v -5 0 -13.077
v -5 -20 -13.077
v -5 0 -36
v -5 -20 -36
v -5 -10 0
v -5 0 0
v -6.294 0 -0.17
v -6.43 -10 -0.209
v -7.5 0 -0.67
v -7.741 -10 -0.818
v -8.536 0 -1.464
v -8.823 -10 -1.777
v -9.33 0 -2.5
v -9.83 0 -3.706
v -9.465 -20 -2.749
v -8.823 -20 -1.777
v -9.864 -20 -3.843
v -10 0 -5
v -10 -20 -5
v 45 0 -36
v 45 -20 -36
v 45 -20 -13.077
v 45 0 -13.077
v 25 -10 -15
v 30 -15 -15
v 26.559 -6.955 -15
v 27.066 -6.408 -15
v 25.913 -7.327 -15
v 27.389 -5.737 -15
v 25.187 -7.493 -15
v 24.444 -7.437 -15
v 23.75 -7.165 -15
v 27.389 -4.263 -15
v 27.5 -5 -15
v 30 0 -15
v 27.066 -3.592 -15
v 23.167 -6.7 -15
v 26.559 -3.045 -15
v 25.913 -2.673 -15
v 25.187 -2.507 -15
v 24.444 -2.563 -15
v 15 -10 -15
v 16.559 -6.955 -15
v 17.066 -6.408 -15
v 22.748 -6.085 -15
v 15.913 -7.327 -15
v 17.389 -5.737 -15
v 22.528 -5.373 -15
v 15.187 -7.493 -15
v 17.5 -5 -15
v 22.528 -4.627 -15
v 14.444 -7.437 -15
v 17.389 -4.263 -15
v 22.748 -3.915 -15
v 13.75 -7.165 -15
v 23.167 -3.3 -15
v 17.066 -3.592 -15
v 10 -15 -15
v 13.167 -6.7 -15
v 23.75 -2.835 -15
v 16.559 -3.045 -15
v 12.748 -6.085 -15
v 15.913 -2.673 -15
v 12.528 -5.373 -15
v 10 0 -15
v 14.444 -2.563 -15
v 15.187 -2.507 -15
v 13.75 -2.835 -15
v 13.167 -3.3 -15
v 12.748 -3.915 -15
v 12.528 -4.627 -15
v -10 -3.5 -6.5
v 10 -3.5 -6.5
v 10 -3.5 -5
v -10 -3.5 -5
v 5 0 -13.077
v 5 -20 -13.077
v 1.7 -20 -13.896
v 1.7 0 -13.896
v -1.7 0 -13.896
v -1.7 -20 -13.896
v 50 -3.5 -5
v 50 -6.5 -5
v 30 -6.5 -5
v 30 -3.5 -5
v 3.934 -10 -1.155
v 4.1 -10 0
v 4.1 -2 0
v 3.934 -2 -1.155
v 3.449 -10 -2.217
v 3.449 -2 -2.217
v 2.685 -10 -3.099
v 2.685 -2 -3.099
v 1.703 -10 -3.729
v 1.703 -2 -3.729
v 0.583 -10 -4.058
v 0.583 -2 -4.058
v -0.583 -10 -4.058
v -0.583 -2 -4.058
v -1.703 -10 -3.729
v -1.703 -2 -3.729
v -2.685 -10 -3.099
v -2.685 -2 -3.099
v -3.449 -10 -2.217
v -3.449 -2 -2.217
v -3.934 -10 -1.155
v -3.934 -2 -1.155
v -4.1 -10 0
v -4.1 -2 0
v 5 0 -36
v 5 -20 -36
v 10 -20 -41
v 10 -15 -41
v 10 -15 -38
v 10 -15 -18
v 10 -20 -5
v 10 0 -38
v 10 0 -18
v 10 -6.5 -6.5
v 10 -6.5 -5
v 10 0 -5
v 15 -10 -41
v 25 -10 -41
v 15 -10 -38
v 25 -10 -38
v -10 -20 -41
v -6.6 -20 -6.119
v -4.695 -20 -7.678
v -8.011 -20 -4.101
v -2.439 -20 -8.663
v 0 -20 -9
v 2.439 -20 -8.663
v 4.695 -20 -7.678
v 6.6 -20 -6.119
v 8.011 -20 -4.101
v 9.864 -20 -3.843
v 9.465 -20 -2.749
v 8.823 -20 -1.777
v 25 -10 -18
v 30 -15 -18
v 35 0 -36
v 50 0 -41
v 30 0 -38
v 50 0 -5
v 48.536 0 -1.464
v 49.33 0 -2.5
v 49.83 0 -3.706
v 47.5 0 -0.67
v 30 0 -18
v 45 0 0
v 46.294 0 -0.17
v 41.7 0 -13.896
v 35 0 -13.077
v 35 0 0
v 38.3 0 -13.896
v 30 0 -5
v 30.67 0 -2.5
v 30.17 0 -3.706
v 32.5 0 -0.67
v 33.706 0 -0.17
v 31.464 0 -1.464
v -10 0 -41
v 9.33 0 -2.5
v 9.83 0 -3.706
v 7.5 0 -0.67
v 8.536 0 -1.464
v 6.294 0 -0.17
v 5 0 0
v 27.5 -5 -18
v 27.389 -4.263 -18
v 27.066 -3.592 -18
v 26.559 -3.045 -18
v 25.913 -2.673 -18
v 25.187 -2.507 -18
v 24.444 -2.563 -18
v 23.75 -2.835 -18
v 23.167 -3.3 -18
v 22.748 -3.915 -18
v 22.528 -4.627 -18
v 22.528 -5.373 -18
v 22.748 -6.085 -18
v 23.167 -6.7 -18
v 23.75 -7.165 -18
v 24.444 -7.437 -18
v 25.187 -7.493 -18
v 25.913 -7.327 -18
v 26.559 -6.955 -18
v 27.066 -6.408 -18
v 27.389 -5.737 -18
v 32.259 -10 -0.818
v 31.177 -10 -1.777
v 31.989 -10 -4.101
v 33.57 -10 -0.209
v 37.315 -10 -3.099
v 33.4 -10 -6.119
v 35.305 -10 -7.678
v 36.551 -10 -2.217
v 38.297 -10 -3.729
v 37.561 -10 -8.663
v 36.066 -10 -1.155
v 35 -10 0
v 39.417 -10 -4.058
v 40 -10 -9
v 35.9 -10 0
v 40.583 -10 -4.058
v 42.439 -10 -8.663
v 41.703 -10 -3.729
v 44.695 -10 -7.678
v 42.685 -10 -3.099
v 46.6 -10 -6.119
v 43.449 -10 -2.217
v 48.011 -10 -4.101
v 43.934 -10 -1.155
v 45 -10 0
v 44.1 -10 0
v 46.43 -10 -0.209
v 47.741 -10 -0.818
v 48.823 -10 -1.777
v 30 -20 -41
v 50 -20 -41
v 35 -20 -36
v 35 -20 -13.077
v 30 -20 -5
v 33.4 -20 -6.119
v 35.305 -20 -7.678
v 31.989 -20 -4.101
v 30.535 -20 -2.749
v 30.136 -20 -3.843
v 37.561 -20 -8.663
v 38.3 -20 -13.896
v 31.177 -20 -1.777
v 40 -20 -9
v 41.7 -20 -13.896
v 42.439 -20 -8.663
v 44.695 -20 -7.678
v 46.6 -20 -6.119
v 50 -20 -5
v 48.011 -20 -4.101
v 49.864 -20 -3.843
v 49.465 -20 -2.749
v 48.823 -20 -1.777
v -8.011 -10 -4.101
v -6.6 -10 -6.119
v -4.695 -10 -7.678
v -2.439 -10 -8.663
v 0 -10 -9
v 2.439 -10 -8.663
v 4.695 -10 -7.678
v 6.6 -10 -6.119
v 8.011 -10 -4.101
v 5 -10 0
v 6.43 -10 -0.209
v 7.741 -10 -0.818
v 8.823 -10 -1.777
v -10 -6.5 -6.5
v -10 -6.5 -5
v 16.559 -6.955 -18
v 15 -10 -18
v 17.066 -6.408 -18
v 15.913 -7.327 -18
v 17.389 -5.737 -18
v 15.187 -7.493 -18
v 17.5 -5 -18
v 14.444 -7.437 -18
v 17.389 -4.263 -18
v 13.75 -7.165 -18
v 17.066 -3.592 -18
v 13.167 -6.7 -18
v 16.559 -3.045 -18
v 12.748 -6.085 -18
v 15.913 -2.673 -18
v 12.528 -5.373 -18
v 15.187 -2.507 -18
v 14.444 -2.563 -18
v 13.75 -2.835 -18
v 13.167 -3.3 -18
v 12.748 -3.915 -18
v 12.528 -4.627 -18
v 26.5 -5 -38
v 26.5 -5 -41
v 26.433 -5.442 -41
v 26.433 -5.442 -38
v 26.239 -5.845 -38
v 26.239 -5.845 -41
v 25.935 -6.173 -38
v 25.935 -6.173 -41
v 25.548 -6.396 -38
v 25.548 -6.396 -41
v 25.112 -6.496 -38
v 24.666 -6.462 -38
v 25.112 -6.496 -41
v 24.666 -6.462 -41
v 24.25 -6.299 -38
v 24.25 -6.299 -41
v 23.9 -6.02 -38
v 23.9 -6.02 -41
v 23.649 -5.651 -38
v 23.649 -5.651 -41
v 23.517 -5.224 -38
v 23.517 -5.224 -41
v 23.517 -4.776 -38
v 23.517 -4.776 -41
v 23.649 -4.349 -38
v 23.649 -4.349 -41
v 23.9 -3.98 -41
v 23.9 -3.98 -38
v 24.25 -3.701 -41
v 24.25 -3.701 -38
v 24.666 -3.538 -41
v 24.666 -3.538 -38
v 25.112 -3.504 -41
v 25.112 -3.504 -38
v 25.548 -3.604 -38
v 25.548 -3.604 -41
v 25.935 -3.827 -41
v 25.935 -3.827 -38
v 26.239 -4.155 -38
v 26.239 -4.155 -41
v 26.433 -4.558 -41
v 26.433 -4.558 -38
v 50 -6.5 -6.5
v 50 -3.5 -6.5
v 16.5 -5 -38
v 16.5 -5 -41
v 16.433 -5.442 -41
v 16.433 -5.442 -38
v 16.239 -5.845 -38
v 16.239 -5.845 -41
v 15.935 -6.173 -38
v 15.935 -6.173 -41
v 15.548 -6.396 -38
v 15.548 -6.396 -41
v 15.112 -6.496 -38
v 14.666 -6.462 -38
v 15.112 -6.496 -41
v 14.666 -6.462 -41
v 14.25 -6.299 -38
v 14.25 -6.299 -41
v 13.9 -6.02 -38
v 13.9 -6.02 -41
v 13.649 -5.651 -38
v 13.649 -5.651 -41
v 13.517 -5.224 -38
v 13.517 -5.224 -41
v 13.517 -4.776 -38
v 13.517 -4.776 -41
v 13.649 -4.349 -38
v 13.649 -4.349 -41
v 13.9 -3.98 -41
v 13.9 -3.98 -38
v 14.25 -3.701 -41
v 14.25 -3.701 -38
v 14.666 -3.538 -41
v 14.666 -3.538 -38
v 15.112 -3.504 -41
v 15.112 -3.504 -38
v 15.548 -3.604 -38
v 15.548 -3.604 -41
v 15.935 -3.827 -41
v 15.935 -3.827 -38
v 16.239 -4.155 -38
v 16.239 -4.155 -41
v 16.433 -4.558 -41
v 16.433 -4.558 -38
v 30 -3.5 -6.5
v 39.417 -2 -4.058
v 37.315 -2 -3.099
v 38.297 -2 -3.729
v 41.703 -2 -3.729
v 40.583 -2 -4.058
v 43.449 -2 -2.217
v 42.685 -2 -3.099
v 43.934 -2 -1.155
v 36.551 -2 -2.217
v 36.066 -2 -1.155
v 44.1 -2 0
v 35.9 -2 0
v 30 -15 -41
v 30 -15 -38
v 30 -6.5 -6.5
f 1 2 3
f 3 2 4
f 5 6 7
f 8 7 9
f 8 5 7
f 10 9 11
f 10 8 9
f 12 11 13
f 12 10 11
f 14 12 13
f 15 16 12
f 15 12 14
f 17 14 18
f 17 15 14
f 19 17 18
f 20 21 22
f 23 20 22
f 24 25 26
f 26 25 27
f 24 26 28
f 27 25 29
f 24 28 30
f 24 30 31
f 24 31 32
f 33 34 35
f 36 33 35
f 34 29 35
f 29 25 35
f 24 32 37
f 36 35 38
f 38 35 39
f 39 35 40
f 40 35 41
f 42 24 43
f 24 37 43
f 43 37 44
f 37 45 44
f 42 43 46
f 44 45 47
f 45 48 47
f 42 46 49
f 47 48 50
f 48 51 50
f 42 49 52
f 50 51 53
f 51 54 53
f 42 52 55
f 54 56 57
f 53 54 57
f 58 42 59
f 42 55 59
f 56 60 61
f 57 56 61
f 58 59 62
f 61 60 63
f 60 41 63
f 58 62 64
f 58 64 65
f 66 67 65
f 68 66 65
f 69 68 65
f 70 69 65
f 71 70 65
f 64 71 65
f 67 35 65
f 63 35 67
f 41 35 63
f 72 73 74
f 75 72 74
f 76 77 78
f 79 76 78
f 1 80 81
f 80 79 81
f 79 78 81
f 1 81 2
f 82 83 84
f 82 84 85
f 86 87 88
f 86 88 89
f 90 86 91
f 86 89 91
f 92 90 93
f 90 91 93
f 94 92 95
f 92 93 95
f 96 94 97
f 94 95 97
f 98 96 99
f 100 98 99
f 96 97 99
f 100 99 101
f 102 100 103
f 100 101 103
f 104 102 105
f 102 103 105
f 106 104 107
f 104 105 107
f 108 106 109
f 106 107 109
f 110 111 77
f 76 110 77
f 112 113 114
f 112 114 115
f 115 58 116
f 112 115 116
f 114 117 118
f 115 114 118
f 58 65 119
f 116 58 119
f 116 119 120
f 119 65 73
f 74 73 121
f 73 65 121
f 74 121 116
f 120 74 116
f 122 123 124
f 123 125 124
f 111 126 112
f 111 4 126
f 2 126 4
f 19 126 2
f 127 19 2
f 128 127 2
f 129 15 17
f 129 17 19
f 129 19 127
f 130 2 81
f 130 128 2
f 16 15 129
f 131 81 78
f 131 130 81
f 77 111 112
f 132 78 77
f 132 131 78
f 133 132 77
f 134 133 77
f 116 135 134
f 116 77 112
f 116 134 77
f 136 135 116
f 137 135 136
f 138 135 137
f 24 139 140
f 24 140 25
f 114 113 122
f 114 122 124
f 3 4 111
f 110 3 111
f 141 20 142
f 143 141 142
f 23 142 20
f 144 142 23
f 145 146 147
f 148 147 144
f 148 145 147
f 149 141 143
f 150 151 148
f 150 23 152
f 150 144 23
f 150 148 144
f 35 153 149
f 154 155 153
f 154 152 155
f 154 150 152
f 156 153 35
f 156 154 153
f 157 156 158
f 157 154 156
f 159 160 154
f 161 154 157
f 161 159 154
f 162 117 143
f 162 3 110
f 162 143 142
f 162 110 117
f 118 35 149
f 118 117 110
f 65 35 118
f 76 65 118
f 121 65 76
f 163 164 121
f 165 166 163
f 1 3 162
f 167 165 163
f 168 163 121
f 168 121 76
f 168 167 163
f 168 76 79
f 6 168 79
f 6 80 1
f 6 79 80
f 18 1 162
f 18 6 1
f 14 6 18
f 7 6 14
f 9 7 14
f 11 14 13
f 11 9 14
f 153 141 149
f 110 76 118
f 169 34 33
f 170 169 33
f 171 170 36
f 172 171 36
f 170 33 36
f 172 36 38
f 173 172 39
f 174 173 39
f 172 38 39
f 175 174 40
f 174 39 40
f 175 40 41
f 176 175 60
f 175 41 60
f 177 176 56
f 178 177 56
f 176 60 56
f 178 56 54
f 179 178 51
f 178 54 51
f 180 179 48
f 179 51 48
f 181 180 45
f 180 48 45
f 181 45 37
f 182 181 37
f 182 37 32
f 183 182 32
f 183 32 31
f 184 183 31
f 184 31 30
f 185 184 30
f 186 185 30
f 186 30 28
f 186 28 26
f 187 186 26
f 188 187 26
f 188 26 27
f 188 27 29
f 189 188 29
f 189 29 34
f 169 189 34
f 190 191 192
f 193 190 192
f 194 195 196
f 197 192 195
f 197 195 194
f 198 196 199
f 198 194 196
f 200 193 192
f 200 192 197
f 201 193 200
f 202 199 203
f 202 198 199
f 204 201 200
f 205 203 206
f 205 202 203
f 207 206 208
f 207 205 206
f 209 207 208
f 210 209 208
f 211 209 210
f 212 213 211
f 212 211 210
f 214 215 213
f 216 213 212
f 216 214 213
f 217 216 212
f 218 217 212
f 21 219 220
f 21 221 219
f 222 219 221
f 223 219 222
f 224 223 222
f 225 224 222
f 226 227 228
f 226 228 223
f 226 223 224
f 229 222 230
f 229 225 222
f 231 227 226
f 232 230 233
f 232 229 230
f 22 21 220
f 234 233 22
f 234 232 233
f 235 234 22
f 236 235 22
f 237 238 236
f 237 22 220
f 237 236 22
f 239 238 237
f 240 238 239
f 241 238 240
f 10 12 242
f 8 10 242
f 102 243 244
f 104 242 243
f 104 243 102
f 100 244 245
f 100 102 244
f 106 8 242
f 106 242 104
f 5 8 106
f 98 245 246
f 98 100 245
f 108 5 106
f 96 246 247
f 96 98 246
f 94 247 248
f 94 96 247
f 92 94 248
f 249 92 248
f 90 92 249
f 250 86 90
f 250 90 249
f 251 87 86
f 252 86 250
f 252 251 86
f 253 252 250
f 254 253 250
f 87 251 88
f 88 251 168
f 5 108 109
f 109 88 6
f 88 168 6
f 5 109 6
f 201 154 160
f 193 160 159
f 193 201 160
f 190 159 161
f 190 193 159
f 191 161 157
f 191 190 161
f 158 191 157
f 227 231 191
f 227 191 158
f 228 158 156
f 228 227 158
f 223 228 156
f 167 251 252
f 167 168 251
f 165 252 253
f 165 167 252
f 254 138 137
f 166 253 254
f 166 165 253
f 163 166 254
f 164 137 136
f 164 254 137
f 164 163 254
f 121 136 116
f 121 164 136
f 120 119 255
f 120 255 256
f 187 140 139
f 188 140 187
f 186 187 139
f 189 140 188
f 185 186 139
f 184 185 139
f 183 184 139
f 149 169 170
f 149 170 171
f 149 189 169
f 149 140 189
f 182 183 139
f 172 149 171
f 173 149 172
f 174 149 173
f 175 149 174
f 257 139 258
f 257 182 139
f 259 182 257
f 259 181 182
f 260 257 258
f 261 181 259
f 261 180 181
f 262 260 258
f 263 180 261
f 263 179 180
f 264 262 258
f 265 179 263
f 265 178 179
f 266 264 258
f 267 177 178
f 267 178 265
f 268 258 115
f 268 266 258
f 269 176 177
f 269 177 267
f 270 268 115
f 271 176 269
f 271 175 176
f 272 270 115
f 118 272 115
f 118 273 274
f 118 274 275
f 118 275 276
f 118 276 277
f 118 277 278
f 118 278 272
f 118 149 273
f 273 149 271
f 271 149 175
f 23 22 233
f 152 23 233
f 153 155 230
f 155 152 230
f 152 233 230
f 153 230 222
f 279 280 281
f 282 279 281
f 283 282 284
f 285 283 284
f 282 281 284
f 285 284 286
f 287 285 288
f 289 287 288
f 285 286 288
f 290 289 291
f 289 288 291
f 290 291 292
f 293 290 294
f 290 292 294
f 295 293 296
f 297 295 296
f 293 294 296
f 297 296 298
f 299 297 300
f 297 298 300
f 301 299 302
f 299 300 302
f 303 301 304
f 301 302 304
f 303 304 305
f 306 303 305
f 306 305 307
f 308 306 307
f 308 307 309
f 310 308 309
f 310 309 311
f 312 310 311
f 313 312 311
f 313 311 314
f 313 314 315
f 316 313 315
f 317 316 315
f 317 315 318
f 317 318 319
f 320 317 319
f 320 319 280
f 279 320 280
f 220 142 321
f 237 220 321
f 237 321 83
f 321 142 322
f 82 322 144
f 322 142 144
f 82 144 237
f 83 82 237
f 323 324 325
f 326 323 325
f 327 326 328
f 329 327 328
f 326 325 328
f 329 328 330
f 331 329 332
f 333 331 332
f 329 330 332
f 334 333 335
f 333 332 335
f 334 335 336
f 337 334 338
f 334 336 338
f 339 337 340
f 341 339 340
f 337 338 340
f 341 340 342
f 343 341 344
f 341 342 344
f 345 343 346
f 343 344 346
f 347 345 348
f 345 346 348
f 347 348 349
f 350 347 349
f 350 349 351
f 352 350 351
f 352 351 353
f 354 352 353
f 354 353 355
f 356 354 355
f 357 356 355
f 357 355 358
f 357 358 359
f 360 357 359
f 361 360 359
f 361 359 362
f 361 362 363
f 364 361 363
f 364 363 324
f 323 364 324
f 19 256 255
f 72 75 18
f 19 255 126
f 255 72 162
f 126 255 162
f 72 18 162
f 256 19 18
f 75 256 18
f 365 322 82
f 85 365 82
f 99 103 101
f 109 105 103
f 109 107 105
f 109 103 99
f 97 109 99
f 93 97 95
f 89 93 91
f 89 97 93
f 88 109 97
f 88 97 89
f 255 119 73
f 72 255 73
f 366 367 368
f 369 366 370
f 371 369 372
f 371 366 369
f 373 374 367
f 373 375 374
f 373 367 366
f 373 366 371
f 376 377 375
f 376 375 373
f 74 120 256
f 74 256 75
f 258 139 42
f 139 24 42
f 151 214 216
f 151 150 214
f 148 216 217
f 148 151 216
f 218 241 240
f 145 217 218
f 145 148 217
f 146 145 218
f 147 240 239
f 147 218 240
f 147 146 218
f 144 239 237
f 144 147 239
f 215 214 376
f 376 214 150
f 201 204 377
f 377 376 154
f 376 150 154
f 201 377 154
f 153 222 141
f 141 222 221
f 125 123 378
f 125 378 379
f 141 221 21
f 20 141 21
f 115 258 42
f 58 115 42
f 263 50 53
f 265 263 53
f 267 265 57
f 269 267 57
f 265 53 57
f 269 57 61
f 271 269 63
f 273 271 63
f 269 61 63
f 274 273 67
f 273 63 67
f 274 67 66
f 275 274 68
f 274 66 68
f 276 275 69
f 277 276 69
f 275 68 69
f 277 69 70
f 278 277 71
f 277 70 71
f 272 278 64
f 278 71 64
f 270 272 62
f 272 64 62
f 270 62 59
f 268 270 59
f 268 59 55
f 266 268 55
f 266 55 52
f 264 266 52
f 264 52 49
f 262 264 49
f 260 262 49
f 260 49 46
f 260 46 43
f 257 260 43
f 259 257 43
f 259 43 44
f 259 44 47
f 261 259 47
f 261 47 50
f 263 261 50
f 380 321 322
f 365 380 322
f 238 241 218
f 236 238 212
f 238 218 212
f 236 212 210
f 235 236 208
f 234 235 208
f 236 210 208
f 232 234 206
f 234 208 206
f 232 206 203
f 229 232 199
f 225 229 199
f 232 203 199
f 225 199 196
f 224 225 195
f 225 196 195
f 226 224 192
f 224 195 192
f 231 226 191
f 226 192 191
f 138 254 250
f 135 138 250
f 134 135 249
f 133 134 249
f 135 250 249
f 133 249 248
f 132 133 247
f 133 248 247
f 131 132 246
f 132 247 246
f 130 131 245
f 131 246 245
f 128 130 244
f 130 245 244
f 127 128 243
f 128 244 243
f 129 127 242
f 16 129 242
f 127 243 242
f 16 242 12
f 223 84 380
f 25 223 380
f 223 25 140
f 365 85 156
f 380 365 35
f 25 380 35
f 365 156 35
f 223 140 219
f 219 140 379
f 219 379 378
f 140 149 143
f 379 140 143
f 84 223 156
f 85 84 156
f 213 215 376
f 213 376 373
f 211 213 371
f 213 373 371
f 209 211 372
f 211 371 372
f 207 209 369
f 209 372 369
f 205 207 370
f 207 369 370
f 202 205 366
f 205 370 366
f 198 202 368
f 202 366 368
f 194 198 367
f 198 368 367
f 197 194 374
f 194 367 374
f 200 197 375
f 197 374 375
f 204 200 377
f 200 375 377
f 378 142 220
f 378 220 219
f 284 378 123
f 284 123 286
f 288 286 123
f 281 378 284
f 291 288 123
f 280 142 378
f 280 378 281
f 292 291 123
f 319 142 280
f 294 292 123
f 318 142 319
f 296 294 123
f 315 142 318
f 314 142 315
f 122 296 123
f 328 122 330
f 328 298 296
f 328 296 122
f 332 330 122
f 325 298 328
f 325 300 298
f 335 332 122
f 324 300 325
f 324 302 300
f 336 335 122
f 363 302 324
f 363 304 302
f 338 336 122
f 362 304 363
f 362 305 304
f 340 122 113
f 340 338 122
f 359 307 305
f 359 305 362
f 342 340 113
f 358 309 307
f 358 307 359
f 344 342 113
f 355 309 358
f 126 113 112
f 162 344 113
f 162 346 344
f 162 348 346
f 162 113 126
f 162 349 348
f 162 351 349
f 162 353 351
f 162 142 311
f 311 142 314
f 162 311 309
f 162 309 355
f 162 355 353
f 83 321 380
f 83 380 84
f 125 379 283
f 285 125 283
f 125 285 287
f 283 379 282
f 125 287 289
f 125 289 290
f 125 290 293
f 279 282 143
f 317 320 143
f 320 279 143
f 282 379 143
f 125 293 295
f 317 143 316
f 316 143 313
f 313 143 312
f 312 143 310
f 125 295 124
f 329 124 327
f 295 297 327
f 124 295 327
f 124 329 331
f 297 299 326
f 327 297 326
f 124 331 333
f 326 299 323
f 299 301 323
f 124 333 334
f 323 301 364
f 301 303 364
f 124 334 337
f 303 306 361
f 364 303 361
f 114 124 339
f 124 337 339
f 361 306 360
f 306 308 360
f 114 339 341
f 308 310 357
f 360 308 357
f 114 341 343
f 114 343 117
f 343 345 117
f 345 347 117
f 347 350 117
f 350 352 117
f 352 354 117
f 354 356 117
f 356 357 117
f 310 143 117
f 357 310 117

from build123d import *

# Parameters (mm, degrees)
F1_DEPTH  = 10
F2_W      = 14.1
F2_H      = 2
F3_DEPTH  = 10
F2_W_2    = 20
F5_DEPTH  = 10
F7_DEPTH  = 25
F8_W      = 3
F8_H      = 1.5
F9_DEPTH  = 100
F10_R     = 4.99999
F10_2_R   = 4.99999
F11_W     = 20
F11_H     = 3
F12_DEPTH = 10
F13_R     = 1.5
F14_DEPTH = 50
F15_R     = 2.5
F15_R_2   = 1.5
F16_DEPTH = 10
F17_SIZE  = 5


# Not quite as in the source:
# - a fillet or chamfer is up to 0.001 mm smaller than in the source, because OpenCascade refuses the exact size


with BuildPart() as f1:
    # F0 (on Front) → F1 (new body)
    with BuildSketch(Plane.XZ):
        with BuildLine():
            ThreePointArc((7, 0), (0, -7), (-7, 0))
            Line((-7, 0), (-10, 0))
            Line((-10, 0), (-10, -41))
            Line((-10, -41), (10, -41))
            Line((10, -41), (10, 0))
            Line((10, 0), (7, 0))
        make_face()
        with BuildLine():
            ThreePointArc((4.1, 0), (0, -4.1), (-4.1, 0))
            Line((-4.1, 0), (-7, 0))
            ThreePointArc((-7, 0), (0, -7), (7, 0))
            Line((7, 0), (4.1, 0))
        make_face()
    extrude(amount=F1_DEPTH)

    # F2 (on face) → F3 (join)
    with BuildSketch(Plane.XY):
        with Locations((2.95, -1)):
            Rectangle(F2_W, F2_H)
    extrude(amount=-F3_DEPTH)

    # F4 (on face) → F5 (join)
    with BuildSketch(Plane.XZ.offset(10)):
        with BuildLine():
            Line((10, 0), (9, 0))
            ThreePointArc((9, 0), (0, -9), (-9, 0))
            Line((-9, 0), (-10, 0))
            Line((-10, 0), (-10, -41))
            Line((-10, -41), (10, -41))
            Line((10, -41), (10, 0))
        make_face()
    extrude(amount=F5_DEPTH)


with BuildPart() as f1b:
    # F0 (on Front) → F1, piece 2 (new body)
    with BuildSketch(Plane.XZ):
        with BuildLine():
            Line((50, 0), (47, 0))
            ThreePointArc((47, 0), (40, -7), (33, 0))
            Line((33, 0), (30, 0))
            Line((30, 0), (30, -41))
            Line((30, -41), (50, -41))
            Line((50, -41), (50, 0))
        make_face()
        with BuildLine():
            ThreePointArc((33, 0), (40, -7), (47, 0))
            Line((47, 0), (44.1, 0))
            ThreePointArc((44.1, 0), (40, -4.1), (35.9, 0))
            Line((35.9, 0), (33, 0))
        make_face()
    extrude(amount=F1_DEPTH)

    # F2 (on face) → F3, piece 2 (join)
    with BuildSketch(Plane.XY):
        with Locations((40, -1)):
            Rectangle(F2_W_2, F2_H)
    extrude(amount=-F3_DEPTH)

    # F4 (on face) → F5, piece 2 (join)
    with BuildSketch(Plane.XZ.offset(10)):
        with BuildLine():
            Line((31, 0), (30, 0))
            Line((30, 0), (30, -41))
            Line((30, -41), (50, -41))
            Line((50, -41), (50, 0))
            Line((50, 0), (49, 0))
            ThreePointArc((49, 0), (40, -9), (31, 0))
        make_face()
    extrude(amount=F5_DEPTH)


with BuildPart() as f7_tool:
    # F6 (on face) → F7 (new body)
    with BuildSketch(Plane.XZ.offset(20)):
        with BuildLine():
            Line((5, -36), (5, -13.0766968306))
            ThreePointArc((5, -13.0766968306), (0, -14), (-5, -13.0766968306))
            Line((-5, -13.0766968306), (-5, -36))
            Line((-5, -36), (5, -36))
        make_face()
        with BuildLine():
            Line((45, -36), (45, -13.0766968306))
            ThreePointArc((45, -13.0766968306), (40, -14), (35, -13.0766968306))
            Line((35, -13.0766968306), (35, -36))
            Line((35, -36), (45, -36))
        make_face()
    extrude(amount=-F7_DEPTH)


with BuildPart() as f1_1:
    add(f1.part)

    # F7: cut by f7_tool
    add(f7_tool.part, mode=Mode.SUBTRACT)


with BuildPart() as f1b_1:
    add(f1b.part)

    # F7: cut by f7_tool
    add(f7_tool.part, mode=Mode.SUBTRACT)


with BuildPart() as f9_tool:
    # F8 (on face) → F9 (new body)
    with BuildSketch(Plane.YZ.offset(50)):
        with Locations((-5, -5.75)):
            Rectangle(F8_W, F8_H)
    extrude(amount=-F9_DEPTH)


with BuildPart() as f1_2:
    add(f1_1.part)

    # F9: cut by f9_tool
    add(f9_tool.part, mode=Mode.SUBTRACT)

    # F10#2 (radius 5 in the source; OpenCascade refuses exactly that, so slightly less here)
    f10_2_edges = [f1_2.edges().sort_by_distance(p)[0] for p in [
        (-10, -10, 0),
        (10, -10, 0),
    ]]
    fillet(f10_2_edges, radius=F10_2_R)



with BuildPart() as f1b_2:
    add(f1b_1.part)

    # F9: cut by f9_tool
    add(f9_tool.part, mode=Mode.SUBTRACT)

    # F10 (radius 5 in the source; OpenCascade refuses exactly that, so slightly less here)
    f10_edges = [f1b_2.edges().sort_by_distance(p)[0] for p in [
        (30, -10, 0),
        (50, -10, 0),
    ]]
    fillet(f10_edges, radius=F10_R)


with BuildPart() as f1_3:
    add(f1_2.part)

    add(f1b_2.part)  # F12 merges F1b
    # F11 (on face) → F12 (join)
    with BuildSketch(Plane(origin=(0, 0, 0), x_dir=(-1, 0, 0), z_dir=(0, 1, 0))):
        with Locations((-20, -39.5)):
            Rectangle(F11_W, F11_H)
        with Locations((-20, -16.5)):
            Rectangle(F11_W, F11_H)
    extrude(amount=-F12_DEPTH)

    # F13 (on face) → F14 (cut)
    with BuildSketch(Plane(origin=(0, 0, -41), x_dir=(1, 0, 0), z_dir=(0, 0, -1))):
        with Locations((15, 5)):
            Circle(F13_R)
        with Locations((25, 5)):
            Circle(F13_R)
    extrude(amount=-F14_DEPTH, mode=Mode.SUBTRACT)

    # F15 (on face) → F16 (cut)
    with BuildSketch(Plane.XY.offset(-15)):
        with Locations((15, -5)):
            Circle(F15_R)
        with Locations((15, -5)):
            Circle(F15_R_2, mode=Mode.SUBTRACT)
        with Locations((25, -5)):
            Circle(F15_R)
        with Locations((25, -5)):
            Circle(F15_R_2, mode=Mode.SUBTRACT)
    extrude(amount=-F16_DEPTH, mode=Mode.SUBTRACT)

    # F17
    f17_edges = [f1_3.edges().sort_by_distance(p)[0] for p in [
        (30, -10, -39.5),
        (10, -10, -39.5),
        (30, -10, -16.5),
        (10, -10, -16.5),
    ]]
    chamfer(f17_edges, length=F17_SIZE)


solid = f1_3.part
